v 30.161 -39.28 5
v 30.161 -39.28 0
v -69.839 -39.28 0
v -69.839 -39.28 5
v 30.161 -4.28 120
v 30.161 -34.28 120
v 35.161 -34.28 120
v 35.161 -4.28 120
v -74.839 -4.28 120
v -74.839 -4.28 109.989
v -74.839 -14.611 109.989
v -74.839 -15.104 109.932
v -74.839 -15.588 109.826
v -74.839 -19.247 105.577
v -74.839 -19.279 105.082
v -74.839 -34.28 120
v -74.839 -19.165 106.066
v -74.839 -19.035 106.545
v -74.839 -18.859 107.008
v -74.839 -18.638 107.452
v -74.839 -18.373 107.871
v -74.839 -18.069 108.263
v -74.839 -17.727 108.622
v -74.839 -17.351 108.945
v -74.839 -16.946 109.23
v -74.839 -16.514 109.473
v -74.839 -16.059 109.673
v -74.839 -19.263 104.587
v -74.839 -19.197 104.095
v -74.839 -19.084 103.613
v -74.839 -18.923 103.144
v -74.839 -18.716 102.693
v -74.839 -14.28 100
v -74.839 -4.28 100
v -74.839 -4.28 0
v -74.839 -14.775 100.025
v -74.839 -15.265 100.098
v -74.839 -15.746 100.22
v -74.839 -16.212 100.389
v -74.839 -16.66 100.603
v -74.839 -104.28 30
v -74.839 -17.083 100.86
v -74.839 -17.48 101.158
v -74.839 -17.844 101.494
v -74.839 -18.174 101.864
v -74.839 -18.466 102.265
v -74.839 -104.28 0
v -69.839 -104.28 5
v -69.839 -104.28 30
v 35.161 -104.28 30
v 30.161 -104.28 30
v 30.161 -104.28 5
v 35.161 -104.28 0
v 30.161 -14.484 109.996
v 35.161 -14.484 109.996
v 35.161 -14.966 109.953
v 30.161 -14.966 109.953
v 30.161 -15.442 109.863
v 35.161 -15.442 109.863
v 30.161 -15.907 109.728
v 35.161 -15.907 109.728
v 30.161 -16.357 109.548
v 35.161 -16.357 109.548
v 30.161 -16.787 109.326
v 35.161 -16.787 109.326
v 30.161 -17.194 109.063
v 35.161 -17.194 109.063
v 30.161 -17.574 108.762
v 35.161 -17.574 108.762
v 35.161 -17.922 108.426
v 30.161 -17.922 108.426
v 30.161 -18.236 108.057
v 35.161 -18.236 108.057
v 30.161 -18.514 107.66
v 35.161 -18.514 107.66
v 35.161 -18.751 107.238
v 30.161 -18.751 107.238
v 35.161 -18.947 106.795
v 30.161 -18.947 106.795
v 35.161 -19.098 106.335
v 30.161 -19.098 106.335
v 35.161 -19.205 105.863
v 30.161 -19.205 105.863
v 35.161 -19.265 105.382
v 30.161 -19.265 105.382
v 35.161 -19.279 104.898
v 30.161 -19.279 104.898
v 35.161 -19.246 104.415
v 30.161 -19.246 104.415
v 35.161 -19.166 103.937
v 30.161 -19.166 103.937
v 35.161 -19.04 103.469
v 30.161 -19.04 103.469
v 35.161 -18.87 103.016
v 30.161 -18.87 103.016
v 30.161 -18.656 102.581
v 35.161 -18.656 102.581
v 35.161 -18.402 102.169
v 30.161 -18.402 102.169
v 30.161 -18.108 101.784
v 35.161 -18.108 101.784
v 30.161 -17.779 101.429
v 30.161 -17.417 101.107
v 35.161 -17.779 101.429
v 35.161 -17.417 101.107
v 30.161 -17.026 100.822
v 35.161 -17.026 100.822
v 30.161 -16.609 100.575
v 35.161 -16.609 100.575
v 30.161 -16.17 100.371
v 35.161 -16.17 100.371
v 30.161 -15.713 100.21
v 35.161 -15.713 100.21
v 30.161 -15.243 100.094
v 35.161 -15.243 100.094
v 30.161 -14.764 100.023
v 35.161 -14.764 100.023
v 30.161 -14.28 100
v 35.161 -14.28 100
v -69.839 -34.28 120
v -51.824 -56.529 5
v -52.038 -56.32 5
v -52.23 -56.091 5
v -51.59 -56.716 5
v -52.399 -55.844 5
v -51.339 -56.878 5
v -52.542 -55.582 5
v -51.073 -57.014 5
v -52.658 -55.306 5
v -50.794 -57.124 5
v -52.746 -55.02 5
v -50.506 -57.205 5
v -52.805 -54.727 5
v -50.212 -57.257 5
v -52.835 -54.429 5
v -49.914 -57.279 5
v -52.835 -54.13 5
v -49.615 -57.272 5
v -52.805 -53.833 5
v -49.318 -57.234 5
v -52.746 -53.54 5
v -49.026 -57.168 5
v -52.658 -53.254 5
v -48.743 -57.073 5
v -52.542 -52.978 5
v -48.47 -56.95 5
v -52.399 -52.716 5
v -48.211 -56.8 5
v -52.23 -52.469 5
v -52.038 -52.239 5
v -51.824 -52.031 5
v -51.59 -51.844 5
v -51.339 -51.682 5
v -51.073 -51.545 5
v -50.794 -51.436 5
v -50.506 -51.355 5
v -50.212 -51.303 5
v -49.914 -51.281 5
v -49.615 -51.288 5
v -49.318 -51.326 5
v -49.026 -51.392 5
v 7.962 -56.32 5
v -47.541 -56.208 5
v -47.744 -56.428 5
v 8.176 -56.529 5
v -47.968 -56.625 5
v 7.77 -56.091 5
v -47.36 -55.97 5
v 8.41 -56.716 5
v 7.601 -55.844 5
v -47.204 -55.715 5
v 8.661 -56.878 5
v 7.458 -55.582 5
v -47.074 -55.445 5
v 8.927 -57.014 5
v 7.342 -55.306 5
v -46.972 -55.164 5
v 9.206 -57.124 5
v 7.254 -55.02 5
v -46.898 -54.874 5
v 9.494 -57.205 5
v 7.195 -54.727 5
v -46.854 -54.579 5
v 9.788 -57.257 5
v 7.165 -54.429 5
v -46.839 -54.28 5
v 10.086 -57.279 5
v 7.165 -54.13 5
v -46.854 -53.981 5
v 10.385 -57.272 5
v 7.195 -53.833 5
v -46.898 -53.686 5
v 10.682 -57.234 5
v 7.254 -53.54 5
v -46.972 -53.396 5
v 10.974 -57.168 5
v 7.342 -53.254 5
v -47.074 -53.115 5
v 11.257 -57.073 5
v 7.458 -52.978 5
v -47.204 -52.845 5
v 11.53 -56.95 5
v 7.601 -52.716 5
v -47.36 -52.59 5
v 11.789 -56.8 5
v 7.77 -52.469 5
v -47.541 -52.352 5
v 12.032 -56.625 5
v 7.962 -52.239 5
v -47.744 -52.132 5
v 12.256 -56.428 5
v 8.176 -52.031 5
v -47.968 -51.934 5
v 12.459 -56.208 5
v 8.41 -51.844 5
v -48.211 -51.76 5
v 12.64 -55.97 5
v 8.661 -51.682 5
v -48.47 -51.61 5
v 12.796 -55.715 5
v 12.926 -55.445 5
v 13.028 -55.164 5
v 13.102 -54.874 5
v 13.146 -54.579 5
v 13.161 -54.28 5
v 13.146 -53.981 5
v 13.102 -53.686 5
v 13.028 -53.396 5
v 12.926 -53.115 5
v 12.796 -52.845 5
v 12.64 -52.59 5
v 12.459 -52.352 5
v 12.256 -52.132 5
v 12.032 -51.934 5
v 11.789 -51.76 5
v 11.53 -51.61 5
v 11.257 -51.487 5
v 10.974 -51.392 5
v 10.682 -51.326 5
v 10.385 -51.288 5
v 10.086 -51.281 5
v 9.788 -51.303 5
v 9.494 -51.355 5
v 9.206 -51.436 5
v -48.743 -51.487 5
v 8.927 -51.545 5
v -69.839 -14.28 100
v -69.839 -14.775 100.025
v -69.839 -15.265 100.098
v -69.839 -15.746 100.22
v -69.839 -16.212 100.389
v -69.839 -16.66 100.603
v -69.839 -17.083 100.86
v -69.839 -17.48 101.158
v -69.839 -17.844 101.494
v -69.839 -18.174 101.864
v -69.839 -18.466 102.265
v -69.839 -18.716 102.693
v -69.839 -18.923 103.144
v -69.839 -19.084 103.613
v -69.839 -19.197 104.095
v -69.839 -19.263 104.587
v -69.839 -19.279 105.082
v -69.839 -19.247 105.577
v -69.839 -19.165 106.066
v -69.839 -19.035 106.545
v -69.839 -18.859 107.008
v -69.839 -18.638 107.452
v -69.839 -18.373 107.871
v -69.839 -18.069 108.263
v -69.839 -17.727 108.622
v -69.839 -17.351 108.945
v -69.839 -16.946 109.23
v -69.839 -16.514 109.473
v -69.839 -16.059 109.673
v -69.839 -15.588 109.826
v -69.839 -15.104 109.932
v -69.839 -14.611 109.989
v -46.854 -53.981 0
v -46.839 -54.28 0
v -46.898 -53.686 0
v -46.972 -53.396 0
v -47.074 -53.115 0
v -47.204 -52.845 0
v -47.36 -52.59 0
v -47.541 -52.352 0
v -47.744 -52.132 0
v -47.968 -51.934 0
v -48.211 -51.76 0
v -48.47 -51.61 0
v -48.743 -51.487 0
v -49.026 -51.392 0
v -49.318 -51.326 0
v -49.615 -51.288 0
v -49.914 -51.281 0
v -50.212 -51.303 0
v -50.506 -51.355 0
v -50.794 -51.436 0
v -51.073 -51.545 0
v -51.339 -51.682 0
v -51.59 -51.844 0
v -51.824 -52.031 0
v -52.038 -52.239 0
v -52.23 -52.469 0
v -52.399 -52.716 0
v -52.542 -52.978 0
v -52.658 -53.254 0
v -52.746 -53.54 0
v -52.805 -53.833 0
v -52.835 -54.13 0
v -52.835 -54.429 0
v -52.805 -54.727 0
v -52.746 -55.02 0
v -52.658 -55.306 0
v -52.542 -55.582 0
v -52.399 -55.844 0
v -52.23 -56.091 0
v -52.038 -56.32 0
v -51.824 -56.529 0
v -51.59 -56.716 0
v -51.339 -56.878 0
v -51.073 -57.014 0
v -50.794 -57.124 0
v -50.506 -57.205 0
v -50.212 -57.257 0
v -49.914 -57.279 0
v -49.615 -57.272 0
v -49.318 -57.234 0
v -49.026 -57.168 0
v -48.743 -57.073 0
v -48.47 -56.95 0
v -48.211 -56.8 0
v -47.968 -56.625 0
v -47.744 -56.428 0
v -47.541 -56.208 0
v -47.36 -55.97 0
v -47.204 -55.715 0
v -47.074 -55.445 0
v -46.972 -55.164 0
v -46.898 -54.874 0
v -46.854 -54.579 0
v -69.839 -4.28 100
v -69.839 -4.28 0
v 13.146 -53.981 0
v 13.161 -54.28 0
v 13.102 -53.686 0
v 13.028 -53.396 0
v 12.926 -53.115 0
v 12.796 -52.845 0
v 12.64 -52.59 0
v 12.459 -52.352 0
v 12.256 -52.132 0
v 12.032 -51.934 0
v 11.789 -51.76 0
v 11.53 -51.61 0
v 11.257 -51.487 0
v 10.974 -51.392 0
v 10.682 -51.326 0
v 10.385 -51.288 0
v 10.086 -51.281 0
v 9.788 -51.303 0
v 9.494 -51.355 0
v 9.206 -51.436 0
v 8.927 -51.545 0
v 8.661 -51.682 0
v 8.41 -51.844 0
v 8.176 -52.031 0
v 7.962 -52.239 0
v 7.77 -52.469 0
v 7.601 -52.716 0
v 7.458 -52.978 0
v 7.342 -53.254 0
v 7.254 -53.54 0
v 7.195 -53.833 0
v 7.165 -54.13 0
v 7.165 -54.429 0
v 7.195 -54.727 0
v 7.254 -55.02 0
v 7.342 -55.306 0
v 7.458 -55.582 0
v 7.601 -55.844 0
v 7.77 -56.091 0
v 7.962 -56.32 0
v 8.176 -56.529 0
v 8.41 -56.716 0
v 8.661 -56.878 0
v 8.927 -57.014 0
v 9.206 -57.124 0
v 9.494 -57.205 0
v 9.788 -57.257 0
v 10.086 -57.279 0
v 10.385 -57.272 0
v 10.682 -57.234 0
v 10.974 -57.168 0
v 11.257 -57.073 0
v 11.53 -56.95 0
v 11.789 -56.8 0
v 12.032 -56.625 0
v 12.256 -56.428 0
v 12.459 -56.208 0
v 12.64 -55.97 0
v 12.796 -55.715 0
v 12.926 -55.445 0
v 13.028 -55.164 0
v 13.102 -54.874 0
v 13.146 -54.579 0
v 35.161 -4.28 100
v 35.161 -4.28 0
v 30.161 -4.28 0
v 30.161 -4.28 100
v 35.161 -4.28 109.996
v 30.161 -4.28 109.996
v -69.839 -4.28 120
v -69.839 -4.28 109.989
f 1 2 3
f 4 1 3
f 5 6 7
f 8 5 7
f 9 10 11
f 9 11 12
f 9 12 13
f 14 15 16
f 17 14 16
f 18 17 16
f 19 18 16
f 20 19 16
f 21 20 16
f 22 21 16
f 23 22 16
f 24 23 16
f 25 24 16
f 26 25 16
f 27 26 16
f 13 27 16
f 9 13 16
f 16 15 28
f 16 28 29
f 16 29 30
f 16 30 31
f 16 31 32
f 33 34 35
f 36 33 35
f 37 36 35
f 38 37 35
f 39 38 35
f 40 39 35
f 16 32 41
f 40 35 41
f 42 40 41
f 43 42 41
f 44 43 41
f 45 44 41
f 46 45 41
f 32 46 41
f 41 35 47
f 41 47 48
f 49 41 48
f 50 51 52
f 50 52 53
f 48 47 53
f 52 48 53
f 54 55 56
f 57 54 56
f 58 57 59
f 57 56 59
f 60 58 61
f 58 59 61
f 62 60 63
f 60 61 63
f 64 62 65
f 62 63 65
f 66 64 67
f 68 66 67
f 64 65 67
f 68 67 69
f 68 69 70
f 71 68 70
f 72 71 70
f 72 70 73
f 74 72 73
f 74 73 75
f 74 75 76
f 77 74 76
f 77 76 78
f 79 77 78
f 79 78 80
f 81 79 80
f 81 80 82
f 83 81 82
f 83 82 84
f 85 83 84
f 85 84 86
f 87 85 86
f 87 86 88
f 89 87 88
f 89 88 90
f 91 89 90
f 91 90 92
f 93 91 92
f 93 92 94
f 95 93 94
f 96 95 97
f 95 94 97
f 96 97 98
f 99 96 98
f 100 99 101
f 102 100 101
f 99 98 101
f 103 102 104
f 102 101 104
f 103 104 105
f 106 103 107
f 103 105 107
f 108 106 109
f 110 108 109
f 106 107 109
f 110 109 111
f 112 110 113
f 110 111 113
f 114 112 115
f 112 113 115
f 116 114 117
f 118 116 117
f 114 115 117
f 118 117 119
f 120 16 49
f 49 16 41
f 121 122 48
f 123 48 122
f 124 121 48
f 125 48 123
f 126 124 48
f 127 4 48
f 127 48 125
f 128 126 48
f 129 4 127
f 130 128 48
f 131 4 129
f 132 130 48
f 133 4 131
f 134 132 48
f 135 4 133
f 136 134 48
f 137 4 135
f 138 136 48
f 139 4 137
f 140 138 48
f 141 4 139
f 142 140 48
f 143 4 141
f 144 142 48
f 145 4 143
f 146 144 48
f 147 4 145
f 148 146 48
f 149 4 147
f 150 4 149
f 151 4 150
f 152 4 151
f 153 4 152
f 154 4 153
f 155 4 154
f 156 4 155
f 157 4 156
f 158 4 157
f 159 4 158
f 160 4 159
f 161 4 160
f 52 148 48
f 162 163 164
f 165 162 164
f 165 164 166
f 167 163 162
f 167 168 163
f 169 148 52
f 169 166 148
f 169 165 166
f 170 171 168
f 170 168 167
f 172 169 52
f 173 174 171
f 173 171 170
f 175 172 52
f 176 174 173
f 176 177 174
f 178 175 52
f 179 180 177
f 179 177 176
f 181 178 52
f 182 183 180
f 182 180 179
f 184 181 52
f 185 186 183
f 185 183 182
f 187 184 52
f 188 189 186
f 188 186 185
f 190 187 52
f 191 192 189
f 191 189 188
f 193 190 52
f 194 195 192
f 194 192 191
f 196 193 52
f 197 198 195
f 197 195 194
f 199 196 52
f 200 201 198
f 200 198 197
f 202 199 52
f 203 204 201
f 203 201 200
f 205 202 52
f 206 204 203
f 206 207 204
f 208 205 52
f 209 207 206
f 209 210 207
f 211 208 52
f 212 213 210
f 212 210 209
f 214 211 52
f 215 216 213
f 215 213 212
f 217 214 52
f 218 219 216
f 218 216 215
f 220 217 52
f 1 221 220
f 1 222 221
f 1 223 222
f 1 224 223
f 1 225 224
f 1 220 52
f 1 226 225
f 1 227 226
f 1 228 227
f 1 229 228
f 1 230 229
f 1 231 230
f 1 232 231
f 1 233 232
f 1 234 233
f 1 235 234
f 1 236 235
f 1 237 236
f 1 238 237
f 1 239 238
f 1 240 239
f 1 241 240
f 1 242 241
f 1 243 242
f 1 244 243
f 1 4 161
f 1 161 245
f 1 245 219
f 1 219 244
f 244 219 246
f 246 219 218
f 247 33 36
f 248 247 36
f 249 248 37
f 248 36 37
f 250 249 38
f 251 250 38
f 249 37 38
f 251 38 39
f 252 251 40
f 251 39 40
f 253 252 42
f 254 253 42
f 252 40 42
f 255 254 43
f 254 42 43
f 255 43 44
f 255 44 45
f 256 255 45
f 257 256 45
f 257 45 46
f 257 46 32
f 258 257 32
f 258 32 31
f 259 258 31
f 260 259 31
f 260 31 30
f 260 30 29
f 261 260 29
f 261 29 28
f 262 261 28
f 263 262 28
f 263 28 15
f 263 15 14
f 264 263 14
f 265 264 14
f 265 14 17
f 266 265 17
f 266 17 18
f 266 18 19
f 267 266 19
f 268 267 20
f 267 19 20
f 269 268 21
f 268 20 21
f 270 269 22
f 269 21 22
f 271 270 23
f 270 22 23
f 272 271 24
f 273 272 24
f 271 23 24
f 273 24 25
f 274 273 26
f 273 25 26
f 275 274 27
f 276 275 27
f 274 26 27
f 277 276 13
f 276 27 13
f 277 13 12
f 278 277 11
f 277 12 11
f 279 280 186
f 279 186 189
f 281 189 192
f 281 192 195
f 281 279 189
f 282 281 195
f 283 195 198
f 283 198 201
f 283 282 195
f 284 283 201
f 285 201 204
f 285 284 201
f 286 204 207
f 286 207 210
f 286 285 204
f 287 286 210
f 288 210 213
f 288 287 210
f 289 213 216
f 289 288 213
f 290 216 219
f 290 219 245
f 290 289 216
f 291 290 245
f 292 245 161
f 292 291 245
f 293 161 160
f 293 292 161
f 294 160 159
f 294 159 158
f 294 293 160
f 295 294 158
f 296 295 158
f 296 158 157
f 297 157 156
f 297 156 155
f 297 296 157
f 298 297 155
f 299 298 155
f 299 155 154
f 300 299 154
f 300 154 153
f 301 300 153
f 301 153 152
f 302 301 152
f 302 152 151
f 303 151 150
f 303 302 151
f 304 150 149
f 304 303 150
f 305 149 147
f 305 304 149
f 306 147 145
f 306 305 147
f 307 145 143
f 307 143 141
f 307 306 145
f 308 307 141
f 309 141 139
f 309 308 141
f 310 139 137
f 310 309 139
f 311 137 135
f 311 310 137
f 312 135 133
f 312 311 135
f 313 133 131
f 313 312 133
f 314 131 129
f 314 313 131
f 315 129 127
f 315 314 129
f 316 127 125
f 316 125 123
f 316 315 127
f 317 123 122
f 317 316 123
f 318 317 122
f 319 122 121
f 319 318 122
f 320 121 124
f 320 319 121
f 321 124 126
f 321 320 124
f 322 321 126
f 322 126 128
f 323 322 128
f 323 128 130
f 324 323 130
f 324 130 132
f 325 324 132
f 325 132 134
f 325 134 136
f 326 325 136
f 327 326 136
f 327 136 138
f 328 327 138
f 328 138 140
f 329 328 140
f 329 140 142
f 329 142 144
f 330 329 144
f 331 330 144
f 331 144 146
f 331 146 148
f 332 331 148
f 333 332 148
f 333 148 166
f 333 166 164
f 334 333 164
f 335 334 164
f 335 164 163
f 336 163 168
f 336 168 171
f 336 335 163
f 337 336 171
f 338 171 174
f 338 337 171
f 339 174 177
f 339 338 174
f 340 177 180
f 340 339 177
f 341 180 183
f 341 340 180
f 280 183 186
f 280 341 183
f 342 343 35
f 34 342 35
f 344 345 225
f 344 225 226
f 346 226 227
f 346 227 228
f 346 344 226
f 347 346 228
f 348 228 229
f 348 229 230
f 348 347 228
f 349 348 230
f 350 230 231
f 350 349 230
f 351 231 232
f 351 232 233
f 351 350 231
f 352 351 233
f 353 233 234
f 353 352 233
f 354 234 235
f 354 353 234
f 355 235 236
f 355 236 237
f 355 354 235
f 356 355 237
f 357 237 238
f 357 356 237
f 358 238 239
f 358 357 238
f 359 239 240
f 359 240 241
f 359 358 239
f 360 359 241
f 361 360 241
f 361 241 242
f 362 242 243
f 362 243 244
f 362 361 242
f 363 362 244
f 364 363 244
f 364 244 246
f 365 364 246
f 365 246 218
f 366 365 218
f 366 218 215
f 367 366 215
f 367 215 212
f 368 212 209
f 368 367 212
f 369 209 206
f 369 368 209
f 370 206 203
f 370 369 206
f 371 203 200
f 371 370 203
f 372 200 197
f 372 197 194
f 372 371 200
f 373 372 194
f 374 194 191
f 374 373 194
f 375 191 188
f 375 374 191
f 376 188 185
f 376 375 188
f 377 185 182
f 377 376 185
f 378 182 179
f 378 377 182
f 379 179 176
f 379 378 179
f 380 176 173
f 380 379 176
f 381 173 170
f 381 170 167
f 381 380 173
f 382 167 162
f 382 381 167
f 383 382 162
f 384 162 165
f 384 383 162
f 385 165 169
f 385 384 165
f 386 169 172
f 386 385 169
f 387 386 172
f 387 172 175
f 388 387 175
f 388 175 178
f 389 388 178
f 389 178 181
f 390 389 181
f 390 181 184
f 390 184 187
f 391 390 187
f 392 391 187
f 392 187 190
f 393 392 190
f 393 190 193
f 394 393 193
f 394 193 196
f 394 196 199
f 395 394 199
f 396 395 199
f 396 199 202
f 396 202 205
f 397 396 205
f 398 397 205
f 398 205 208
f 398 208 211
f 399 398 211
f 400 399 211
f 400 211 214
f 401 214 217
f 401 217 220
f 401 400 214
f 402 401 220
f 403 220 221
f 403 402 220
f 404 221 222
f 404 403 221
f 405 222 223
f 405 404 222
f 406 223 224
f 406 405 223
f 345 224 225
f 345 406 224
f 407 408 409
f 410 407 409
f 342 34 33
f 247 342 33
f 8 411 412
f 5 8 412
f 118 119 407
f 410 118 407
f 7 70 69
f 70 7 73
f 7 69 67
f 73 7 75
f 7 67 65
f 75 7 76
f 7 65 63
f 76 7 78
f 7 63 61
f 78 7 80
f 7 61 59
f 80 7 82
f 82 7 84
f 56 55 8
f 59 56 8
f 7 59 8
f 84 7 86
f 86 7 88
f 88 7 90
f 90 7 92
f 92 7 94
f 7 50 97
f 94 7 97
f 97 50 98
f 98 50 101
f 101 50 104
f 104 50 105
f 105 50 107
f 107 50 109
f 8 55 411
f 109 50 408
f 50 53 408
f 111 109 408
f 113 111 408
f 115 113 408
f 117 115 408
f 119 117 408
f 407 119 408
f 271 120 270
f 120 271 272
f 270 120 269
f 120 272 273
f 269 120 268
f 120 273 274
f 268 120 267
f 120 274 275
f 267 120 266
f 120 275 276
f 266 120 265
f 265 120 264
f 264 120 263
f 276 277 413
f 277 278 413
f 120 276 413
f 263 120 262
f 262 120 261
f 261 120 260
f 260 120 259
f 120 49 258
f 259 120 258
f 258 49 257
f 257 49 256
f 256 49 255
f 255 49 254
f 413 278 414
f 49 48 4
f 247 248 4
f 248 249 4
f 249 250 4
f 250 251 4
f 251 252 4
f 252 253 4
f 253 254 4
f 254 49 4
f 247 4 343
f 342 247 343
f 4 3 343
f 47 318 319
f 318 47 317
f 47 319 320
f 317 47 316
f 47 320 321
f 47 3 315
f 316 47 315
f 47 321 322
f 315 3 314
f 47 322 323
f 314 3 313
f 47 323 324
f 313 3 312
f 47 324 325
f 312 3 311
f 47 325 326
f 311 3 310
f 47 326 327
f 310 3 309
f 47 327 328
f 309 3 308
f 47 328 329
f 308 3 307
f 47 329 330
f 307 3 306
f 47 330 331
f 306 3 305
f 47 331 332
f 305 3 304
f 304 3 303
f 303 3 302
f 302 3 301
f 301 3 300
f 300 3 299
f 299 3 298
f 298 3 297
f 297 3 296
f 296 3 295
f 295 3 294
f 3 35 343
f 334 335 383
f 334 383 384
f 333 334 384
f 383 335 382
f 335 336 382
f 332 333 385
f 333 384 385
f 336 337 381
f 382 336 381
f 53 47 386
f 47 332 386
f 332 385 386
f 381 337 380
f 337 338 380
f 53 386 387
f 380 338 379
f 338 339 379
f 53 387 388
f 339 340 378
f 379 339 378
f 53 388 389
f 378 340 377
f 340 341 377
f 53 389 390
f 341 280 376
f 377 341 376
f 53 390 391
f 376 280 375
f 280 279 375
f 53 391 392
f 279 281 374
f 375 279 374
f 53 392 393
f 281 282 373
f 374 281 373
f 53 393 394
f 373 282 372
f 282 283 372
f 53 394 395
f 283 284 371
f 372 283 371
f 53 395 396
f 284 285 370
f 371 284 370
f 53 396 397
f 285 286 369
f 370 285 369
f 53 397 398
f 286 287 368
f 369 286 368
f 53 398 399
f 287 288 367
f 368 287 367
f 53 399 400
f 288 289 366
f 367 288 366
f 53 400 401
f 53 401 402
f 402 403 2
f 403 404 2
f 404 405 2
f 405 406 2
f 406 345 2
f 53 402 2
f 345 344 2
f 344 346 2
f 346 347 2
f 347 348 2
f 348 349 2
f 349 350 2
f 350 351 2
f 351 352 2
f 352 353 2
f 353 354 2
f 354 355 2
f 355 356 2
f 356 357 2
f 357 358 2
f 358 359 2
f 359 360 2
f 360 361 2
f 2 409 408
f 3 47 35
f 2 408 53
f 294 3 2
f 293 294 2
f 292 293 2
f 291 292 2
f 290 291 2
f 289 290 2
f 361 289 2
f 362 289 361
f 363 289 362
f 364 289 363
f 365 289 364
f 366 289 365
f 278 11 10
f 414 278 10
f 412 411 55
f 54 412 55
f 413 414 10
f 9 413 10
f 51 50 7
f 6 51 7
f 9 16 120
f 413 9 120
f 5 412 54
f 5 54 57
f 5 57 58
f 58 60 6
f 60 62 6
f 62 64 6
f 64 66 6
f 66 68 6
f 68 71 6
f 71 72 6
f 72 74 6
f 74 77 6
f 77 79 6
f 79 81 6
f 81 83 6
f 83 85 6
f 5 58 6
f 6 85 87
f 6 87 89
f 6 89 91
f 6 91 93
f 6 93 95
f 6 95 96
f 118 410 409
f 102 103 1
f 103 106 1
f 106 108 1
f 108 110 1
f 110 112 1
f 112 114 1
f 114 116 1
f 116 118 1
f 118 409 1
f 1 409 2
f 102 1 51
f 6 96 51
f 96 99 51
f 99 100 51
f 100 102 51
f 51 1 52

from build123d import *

# Parameters (mm, degrees)
F0_R     = 3
F1_DEPTH = 5
F3_DEPTH = 115
F5_DEPTH = 25
F7_DEPTH = 25


with BuildPart() as f1:
    # F0 (on Top) → F1 (new body)
    with BuildSketch(Plane.XY):
        Polygon((-74.838845, -4.279941), (-74.838845, -104.279941), (35.161155, -104.279941), (35.161155, -4.279941), (30.161155, -4.279941), (30.161155, -39.279941), (-69.838845, -39.279941), (-69.838845, -4.279941), align=None)
        with Locations((-49.838845, -54.279941)):
            Circle(F0_R, mode=Mode.SUBTRACT)
        with Locations((10.161155, -54.279941)):
            Circle(F0_R, mode=Mode.SUBTRACT)
    extrude(amount=F1_DEPTH)

    # F2 (on face) → F3 (join)
    with BuildSketch(Plane.XY.offset(5)):
        Polygon((-74.838845, -104.279941), (-69.838845, -104.279941), (-69.838845, -39.279941), (-69.838845, -4.279941), (-74.838845, -4.279941), align=None)
        Polygon((30.161155, -39.279941), (30.161155, -104.279941), (35.161155, -104.279941), (35.161155, -4.279941), (30.161155, -4.279941), align=None)
    extrude(amount=F3_DEPTH)

    # F4 (on face) → F5 (cut)
    with BuildSketch(Plane.YZ.offset(35.161155)):
        Polygon((-104.279941, 30), (-34.279941, 120), (-104.279941, 120), align=None)
        with BuildLine():
            Line((-4.279941, 100), (-4.279941, 109.995835))
            Line((-4.279941, 109.995835), (-14.075894, 109.995835))
            Line((-14.075894, 109.995835), (-14.483987, 109.995835))
            ThreePointArc((-14.483987, 109.995835), (-19.2789, 104.897956), (-14.279941, 100))
            Line((-14.279941, 100), (-4.279941, 100))
        make_face()
    extrude(amount=-F5_DEPTH, mode=Mode.SUBTRACT)

    # F6 (on face) → F7 (cut)
    with BuildSketch(Plane(origin=(-74.838845, 0, 0), x_dir=(0, -1, 0), z_dir=(-1, 0, 0))):
        with BuildLine():
            Line((13.948806, 109.989023), (4.279941, 109.989023))
            Line((4.279941, 109.989023), (4.279941, 100))
            Line((4.279941, 100), (14.279941, 100))
            ThreePointArc((14.279941, 100), (19.277196, 104.834341), (14.611076, 109.989023))
            Line((14.611076, 109.989023), (13.948806, 109.989023))
        make_face()
        Polygon((104.279941, 120), (34.279941, 120), (104.279941, 30), align=None)
    extrude(amount=-F7_DEPTH, mode=Mode.SUBTRACT)


solid = f1.part
